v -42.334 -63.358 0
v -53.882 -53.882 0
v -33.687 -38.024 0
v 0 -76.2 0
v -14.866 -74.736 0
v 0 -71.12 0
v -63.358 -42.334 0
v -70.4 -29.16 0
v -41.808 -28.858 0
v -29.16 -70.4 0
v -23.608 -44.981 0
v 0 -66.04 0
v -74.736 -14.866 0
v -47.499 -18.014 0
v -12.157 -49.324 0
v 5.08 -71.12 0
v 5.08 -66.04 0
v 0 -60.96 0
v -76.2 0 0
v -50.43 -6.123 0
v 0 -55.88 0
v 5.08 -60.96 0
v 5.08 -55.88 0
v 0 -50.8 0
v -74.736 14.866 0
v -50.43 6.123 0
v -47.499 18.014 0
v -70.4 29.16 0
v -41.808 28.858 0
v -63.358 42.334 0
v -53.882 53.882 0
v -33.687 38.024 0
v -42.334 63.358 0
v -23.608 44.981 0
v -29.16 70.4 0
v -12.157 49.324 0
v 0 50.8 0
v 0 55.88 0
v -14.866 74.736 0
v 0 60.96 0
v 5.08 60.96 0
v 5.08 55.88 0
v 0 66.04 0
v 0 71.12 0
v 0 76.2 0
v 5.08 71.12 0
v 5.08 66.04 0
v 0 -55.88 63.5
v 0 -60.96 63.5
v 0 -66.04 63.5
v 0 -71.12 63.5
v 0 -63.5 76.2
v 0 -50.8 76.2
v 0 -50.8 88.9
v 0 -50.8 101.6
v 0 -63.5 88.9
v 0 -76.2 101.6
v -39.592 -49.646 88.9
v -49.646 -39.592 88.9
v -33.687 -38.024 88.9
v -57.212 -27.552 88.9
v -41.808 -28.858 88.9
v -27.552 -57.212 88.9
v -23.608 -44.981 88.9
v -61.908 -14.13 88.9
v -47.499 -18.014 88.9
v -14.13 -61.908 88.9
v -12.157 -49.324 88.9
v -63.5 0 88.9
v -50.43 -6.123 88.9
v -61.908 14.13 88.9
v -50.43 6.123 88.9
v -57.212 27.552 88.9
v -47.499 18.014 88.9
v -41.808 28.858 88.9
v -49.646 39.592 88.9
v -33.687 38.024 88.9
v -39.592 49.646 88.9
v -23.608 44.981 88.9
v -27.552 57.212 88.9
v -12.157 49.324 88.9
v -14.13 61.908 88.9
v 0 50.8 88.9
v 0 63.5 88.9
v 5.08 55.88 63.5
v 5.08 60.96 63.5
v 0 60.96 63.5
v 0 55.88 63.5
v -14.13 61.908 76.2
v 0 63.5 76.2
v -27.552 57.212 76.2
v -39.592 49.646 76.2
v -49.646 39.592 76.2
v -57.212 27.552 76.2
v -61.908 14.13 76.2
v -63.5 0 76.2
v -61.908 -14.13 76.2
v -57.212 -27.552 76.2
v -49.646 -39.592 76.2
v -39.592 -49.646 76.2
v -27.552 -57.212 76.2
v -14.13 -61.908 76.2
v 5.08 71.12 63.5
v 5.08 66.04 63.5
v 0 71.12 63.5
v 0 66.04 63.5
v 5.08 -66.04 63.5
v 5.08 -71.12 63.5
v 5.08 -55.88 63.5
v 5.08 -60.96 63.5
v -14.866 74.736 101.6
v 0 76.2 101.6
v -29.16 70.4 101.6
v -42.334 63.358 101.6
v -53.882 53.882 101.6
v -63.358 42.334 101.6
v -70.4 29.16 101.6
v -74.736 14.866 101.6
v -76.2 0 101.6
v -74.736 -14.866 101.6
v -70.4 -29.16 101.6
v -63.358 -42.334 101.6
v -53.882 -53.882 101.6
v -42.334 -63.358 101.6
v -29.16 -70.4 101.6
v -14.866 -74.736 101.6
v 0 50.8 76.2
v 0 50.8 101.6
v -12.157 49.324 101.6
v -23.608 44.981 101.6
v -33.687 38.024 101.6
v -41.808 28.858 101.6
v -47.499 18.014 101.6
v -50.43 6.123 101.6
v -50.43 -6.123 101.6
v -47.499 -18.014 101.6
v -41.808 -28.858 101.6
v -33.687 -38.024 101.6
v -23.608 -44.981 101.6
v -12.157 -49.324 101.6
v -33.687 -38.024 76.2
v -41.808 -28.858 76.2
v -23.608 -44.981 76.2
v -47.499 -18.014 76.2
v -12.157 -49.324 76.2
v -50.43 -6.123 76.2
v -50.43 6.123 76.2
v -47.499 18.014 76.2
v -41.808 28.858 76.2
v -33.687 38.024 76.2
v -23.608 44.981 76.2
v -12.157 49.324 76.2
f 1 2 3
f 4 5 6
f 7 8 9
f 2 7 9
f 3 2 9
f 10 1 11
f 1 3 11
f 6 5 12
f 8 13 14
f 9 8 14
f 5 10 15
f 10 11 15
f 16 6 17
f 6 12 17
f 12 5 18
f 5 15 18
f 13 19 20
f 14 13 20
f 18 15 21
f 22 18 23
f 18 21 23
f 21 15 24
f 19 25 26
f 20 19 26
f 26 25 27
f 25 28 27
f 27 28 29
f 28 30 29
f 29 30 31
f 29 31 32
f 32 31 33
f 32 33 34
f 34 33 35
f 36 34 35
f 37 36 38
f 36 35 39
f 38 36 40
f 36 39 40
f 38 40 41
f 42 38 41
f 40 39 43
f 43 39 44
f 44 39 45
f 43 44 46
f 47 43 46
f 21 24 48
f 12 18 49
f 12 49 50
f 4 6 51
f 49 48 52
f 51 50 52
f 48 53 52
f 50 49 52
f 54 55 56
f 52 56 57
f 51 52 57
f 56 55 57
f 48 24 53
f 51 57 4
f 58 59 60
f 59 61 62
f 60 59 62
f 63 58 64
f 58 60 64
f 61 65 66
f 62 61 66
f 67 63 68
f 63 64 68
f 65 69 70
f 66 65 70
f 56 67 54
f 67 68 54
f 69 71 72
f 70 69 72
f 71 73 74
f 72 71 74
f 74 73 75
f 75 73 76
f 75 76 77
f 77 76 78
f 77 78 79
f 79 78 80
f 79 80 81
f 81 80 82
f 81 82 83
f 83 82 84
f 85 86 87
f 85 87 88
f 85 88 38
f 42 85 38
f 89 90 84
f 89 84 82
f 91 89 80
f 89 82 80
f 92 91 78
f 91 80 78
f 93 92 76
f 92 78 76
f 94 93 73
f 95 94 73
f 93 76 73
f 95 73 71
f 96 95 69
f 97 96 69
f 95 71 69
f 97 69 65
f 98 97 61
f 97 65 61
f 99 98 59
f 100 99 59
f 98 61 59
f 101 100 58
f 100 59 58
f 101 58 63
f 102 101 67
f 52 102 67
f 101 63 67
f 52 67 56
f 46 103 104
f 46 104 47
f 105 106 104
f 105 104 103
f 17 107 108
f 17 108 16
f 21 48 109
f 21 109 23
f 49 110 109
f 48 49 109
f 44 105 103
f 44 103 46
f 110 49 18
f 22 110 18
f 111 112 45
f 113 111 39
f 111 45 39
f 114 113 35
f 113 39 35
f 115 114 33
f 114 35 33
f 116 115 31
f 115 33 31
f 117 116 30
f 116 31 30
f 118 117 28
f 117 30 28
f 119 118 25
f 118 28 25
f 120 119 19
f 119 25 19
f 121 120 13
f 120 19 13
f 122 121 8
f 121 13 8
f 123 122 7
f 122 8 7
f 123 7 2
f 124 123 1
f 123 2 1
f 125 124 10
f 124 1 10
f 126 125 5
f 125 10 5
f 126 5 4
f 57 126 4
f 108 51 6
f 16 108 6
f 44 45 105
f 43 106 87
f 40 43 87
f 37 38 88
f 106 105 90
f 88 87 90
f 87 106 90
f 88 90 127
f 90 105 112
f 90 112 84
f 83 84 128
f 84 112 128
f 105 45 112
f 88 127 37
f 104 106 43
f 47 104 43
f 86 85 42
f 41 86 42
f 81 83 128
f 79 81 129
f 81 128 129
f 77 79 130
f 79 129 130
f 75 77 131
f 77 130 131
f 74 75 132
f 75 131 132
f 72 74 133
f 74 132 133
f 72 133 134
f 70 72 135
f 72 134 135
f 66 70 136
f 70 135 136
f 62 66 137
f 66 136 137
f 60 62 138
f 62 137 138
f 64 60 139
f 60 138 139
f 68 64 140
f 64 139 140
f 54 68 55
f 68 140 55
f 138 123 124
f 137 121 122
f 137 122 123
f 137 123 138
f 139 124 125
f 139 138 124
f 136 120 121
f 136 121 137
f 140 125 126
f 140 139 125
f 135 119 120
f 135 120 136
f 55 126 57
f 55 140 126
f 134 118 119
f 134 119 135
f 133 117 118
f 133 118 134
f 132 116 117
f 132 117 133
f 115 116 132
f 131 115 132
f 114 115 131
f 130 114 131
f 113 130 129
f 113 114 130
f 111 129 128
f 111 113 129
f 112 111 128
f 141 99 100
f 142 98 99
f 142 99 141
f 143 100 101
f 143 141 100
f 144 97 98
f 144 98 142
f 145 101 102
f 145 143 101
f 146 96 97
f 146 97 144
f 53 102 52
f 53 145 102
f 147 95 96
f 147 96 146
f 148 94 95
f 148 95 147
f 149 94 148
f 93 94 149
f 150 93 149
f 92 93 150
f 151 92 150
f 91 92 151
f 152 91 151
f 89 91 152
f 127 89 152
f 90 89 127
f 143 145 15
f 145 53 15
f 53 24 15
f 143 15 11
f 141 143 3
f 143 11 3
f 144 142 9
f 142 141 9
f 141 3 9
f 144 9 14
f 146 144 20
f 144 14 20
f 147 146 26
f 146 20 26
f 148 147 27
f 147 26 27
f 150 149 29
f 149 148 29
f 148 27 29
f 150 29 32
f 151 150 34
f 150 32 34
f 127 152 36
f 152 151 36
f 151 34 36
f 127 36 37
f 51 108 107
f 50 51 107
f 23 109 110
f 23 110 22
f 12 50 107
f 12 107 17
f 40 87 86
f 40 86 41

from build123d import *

# Parameters (mm, degrees)
SKETCH1_R               = 76.2
BOSS_EXTRUDE1_DEPTH     = 101.6
SKETCH2_R               = 63.5
CUT_EXTRUDE1_DEPTH      = 25.4
SKETCH3_R               = 63.5
SKETCH3_R_2             = 50.8
BOSS_EXTRUDE2_DEPTH     = 12.7
SKETCH4_R               = 50.8
CUT_EXTRUDE2_DEPTH      = 102.6
CUT_EXTRUDE3_DEPTH      = 102.6
SKETCH6_W               = 63.5
SKETCH6_H               = 5.08
BOSS_EXTRUDE4_DEPTH     = 5.08
LPATTERN1_COUNT         = 2
LPATTERN1_PITCH         = 10.16
MIRROR1_COPY_1_SKETCH_W = 63.5
MIRROR1_COPY_1_SKETCH_H = 5.08
MIRROR1_COPY_1_DEPTH    = 5.08


with BuildPart() as part:
    # Sketch1 → Boss-Extrude1 (new body)
    with BuildSketch(Plane.XY):
        Circle(SKETCH1_R)
    extrude(amount=BOSS_EXTRUDE1_DEPTH)

    # Sketch2 → Cut-Extrude1 (cut)
    with BuildSketch(Plane.XY.offset(101.6)):
        Circle(SKETCH2_R)
    extrude(amount=-CUT_EXTRUDE1_DEPTH, mode=Mode.SUBTRACT)

    # Sketch3 → Boss-Extrude2 (add)
    with BuildSketch(Plane.XY.offset(101.6)):
        Circle(SKETCH3_R)
        Circle(SKETCH3_R_2, mode=Mode.SUBTRACT)
    extrude(amount=-BOSS_EXTRUDE2_DEPTH)

    # Sketch4 → Cut-Extrude2 (cut, through all)
    with BuildSketch(Plane(origin=(0, 0, 0), x_dir=(-1, 0, 0), z_dir=(0, 0, -1))):
        Circle(SKETCH4_R)
    extrude(amount=-CUT_EXTRUDE2_DEPTH, mode=Mode.SUBTRACT)

    # Sketch5 → Cut-Extrude3 (cut, through all)
    with BuildSketch(Plane.XY.offset(101.6)):
        with BuildLine():
            Line((0, 76.2), (0, -76.2))
            ThreePointArc((0, -76.2), (76.2, 0), (0, 76.2))
        make_face()
    extrude(amount=-CUT_EXTRUDE3_DEPTH, mode=Mode.SUBTRACT)

    # Sketch6 → Boss-Extrude4 (add)
    with BuildSketch(Plane(origin=(0, 0, 0), x_dir=(0, 0, -1), z_dir=(1, 0, 0))):
        with Locations((-31.75, -58.42)):
            Rectangle(SKETCH6_W, SKETCH6_H)
    boss_extrude4 = extrude(amount=BOSS_EXTRUDE4_DEPTH)

    # LPattern1: Boss-Extrude4 ×2
    with Locations(*[(0, -i * LPATTERN1_PITCH, 0) for i in range(1, LPATTERN1_COUNT)]):
        add(boss_extrude4)

    # Mirror1: Boss-Extrude4 across plane
    add(boss_extrude4.mirror(Plane.ZX))

    # Mirror1 copy 1 sketch → Mirror1 copy 1 (add)
    with BuildSketch(Plane(origin=(0, 10.16, 0), x_dir=(0, 0, -1), z_dir=(1, 0, 0))):
        with Locations((-31.75, 58.42)):
            Rectangle(MIRROR1_COPY_1_SKETCH_W, MIRROR1_COPY_1_SKETCH_H)
    extrude(amount=MIRROR1_COPY_1_DEPTH)


solid = part.part
